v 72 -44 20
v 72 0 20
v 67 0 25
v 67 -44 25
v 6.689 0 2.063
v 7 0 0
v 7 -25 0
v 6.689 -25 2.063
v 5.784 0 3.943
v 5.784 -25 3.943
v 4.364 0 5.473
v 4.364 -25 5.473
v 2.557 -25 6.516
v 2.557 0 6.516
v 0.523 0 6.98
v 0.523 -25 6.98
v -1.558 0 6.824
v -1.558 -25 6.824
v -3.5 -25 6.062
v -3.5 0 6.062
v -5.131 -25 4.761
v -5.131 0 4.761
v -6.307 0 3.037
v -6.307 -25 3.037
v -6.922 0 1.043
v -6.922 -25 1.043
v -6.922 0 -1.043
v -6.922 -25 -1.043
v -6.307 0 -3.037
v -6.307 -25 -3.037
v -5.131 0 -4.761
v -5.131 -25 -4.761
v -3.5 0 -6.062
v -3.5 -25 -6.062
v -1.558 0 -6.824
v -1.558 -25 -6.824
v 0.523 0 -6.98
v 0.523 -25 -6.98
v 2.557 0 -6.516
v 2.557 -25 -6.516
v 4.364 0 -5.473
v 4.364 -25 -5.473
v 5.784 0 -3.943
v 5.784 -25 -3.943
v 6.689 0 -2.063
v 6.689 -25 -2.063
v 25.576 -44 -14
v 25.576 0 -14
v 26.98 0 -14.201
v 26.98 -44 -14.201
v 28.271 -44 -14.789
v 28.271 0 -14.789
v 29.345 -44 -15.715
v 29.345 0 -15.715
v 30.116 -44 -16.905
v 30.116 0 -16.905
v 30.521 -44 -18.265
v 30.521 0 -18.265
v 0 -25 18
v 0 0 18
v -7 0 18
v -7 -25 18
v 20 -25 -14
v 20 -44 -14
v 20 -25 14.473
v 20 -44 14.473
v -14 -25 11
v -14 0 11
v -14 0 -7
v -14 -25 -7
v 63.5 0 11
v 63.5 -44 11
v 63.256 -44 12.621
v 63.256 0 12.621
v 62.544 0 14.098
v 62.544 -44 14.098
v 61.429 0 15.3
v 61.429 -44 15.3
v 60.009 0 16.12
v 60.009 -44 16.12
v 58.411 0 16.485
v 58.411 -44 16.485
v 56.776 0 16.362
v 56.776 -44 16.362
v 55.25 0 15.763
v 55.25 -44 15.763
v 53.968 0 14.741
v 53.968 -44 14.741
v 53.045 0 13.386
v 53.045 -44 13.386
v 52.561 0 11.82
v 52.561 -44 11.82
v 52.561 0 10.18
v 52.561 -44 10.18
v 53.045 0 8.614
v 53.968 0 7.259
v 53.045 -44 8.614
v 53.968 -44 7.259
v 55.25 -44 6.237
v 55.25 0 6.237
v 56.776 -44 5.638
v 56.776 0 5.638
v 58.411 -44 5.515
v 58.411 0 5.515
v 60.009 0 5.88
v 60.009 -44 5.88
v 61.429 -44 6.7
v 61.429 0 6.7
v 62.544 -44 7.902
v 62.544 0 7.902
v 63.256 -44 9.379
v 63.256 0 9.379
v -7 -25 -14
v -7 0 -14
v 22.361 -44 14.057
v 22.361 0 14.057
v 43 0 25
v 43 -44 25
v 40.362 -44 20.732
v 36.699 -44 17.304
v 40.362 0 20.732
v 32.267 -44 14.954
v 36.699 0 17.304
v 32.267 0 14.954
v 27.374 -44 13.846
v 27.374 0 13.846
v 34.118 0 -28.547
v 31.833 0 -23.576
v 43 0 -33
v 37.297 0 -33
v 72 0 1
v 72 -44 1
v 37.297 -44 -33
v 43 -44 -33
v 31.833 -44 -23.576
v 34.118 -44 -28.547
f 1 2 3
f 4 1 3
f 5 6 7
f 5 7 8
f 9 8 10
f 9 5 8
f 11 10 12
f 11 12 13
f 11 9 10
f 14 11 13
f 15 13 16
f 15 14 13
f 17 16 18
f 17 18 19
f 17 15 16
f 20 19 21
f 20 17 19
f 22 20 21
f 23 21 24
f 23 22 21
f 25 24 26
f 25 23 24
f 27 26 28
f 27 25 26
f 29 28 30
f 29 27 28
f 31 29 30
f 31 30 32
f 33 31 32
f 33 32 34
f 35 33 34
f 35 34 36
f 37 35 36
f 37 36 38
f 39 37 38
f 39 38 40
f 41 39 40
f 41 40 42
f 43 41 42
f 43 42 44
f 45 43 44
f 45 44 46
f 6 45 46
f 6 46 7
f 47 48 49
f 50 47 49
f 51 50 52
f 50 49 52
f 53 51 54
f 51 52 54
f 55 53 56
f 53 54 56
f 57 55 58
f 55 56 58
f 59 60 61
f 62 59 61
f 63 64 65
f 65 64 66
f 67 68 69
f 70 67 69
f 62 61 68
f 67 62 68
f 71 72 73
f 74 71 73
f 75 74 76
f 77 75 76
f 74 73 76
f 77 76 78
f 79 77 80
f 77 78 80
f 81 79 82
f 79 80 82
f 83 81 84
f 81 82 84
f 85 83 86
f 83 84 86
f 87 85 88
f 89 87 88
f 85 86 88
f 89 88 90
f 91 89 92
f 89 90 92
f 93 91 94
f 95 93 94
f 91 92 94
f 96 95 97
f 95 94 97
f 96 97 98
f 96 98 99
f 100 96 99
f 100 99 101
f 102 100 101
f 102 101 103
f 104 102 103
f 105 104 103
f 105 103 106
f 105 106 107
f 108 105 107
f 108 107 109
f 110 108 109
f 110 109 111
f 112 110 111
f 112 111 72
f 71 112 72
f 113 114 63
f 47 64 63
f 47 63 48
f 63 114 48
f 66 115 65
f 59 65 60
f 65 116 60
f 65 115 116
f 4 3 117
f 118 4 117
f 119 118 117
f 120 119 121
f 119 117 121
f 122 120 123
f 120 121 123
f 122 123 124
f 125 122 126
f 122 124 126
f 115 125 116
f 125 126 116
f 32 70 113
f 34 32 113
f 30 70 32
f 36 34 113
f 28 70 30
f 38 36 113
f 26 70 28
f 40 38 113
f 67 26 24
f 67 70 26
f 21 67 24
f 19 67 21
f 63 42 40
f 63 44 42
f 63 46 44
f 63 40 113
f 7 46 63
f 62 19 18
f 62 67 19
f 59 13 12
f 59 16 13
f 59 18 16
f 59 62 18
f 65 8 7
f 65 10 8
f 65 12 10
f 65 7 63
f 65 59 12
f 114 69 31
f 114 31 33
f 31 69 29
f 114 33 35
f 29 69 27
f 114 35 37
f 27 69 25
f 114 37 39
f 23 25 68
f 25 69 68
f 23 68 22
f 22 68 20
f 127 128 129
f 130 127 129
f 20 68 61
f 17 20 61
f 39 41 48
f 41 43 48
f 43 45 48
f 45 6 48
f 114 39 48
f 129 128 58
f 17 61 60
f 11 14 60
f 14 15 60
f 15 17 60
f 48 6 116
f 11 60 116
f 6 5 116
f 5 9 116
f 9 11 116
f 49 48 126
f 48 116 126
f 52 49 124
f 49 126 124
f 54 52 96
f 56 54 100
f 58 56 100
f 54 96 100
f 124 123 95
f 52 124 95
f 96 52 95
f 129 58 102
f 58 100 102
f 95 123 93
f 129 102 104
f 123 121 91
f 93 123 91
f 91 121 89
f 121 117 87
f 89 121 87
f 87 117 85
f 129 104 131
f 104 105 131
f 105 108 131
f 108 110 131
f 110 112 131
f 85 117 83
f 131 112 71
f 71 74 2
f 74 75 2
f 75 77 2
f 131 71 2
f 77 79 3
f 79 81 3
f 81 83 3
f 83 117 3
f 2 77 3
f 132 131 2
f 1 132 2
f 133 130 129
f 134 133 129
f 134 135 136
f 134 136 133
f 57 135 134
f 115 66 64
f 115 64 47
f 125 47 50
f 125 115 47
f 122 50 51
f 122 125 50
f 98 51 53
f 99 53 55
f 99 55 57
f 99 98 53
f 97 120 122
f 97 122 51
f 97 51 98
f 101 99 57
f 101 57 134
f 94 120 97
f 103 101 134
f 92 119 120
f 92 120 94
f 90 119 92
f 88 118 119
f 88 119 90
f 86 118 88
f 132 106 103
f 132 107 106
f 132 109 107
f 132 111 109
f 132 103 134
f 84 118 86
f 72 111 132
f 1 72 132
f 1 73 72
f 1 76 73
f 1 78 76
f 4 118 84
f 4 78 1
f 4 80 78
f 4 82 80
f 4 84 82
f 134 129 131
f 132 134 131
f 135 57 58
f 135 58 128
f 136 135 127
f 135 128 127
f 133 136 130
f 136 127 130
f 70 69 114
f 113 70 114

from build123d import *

# Parameters (mm, degrees)
F0_R     = 7
F1_DEPTH = 44
F2_R     = 7
F3_DEPTH = 19
F2_R_2   = 5.5
F4_DEPTH = 44.001


with BuildPart() as f1:
    # F0 (on Front) → F1 (new body)
    with BuildSketch(Plane.XZ):
        with BuildLine():
            Line((-7, 18), (-14, 11))
            Line((-14, 11), (-14, -7))
            Line((-14, -7), (-7, -14))
            Line((-7, -14), (25.575539, -14))
            ThreePointArc((25.575539, -14), (28.840775, -15.213414), (30.521178, -18.264706))
            ThreePointArc((30.521178, -18.264706), (32.858008, -26.115672), (37.29698, -33))
            Line((37.29698, -33), (43, -33))
            Line((43, -33), (72, 1))
            Line((72, 1), (72, 20))
            Line((72, 20), (67, 25))
            Line((67, 25), (43, 25))
            ThreePointArc((43, 25), (34.561099, 15.982044), (22.361381, 14.057085))
            Line((22.361381, 14.057085), (0, 18))
            Line((0, 18), (-7, 18))
        make_face()
        Circle(F0_R, mode=Mode.SUBTRACT)
    extrude(amount=F1_DEPTH)

    # F2 (on face) → F3 (cut)
    with BuildSketch(Plane.XZ.offset(44)):
        Polygon((20, -14), (20, 14.47346), (0, 18), (-7, 18), (-14, 11), (-14, -7), (-7, -14), align=None)
        Circle(F2_R, mode=Mode.SUBTRACT)
    extrude(amount=-F3_DEPTH, mode=Mode.SUBTRACT)

    # F2 (on face) → F4 (cut, through all)
    with BuildSketch(Plane.XZ.offset(44)):
        with Locations((58, 11)):
            Circle(F2_R_2)
    extrude(amount=-F4_DEPTH, mode=Mode.SUBTRACT)


solid = f1.part
